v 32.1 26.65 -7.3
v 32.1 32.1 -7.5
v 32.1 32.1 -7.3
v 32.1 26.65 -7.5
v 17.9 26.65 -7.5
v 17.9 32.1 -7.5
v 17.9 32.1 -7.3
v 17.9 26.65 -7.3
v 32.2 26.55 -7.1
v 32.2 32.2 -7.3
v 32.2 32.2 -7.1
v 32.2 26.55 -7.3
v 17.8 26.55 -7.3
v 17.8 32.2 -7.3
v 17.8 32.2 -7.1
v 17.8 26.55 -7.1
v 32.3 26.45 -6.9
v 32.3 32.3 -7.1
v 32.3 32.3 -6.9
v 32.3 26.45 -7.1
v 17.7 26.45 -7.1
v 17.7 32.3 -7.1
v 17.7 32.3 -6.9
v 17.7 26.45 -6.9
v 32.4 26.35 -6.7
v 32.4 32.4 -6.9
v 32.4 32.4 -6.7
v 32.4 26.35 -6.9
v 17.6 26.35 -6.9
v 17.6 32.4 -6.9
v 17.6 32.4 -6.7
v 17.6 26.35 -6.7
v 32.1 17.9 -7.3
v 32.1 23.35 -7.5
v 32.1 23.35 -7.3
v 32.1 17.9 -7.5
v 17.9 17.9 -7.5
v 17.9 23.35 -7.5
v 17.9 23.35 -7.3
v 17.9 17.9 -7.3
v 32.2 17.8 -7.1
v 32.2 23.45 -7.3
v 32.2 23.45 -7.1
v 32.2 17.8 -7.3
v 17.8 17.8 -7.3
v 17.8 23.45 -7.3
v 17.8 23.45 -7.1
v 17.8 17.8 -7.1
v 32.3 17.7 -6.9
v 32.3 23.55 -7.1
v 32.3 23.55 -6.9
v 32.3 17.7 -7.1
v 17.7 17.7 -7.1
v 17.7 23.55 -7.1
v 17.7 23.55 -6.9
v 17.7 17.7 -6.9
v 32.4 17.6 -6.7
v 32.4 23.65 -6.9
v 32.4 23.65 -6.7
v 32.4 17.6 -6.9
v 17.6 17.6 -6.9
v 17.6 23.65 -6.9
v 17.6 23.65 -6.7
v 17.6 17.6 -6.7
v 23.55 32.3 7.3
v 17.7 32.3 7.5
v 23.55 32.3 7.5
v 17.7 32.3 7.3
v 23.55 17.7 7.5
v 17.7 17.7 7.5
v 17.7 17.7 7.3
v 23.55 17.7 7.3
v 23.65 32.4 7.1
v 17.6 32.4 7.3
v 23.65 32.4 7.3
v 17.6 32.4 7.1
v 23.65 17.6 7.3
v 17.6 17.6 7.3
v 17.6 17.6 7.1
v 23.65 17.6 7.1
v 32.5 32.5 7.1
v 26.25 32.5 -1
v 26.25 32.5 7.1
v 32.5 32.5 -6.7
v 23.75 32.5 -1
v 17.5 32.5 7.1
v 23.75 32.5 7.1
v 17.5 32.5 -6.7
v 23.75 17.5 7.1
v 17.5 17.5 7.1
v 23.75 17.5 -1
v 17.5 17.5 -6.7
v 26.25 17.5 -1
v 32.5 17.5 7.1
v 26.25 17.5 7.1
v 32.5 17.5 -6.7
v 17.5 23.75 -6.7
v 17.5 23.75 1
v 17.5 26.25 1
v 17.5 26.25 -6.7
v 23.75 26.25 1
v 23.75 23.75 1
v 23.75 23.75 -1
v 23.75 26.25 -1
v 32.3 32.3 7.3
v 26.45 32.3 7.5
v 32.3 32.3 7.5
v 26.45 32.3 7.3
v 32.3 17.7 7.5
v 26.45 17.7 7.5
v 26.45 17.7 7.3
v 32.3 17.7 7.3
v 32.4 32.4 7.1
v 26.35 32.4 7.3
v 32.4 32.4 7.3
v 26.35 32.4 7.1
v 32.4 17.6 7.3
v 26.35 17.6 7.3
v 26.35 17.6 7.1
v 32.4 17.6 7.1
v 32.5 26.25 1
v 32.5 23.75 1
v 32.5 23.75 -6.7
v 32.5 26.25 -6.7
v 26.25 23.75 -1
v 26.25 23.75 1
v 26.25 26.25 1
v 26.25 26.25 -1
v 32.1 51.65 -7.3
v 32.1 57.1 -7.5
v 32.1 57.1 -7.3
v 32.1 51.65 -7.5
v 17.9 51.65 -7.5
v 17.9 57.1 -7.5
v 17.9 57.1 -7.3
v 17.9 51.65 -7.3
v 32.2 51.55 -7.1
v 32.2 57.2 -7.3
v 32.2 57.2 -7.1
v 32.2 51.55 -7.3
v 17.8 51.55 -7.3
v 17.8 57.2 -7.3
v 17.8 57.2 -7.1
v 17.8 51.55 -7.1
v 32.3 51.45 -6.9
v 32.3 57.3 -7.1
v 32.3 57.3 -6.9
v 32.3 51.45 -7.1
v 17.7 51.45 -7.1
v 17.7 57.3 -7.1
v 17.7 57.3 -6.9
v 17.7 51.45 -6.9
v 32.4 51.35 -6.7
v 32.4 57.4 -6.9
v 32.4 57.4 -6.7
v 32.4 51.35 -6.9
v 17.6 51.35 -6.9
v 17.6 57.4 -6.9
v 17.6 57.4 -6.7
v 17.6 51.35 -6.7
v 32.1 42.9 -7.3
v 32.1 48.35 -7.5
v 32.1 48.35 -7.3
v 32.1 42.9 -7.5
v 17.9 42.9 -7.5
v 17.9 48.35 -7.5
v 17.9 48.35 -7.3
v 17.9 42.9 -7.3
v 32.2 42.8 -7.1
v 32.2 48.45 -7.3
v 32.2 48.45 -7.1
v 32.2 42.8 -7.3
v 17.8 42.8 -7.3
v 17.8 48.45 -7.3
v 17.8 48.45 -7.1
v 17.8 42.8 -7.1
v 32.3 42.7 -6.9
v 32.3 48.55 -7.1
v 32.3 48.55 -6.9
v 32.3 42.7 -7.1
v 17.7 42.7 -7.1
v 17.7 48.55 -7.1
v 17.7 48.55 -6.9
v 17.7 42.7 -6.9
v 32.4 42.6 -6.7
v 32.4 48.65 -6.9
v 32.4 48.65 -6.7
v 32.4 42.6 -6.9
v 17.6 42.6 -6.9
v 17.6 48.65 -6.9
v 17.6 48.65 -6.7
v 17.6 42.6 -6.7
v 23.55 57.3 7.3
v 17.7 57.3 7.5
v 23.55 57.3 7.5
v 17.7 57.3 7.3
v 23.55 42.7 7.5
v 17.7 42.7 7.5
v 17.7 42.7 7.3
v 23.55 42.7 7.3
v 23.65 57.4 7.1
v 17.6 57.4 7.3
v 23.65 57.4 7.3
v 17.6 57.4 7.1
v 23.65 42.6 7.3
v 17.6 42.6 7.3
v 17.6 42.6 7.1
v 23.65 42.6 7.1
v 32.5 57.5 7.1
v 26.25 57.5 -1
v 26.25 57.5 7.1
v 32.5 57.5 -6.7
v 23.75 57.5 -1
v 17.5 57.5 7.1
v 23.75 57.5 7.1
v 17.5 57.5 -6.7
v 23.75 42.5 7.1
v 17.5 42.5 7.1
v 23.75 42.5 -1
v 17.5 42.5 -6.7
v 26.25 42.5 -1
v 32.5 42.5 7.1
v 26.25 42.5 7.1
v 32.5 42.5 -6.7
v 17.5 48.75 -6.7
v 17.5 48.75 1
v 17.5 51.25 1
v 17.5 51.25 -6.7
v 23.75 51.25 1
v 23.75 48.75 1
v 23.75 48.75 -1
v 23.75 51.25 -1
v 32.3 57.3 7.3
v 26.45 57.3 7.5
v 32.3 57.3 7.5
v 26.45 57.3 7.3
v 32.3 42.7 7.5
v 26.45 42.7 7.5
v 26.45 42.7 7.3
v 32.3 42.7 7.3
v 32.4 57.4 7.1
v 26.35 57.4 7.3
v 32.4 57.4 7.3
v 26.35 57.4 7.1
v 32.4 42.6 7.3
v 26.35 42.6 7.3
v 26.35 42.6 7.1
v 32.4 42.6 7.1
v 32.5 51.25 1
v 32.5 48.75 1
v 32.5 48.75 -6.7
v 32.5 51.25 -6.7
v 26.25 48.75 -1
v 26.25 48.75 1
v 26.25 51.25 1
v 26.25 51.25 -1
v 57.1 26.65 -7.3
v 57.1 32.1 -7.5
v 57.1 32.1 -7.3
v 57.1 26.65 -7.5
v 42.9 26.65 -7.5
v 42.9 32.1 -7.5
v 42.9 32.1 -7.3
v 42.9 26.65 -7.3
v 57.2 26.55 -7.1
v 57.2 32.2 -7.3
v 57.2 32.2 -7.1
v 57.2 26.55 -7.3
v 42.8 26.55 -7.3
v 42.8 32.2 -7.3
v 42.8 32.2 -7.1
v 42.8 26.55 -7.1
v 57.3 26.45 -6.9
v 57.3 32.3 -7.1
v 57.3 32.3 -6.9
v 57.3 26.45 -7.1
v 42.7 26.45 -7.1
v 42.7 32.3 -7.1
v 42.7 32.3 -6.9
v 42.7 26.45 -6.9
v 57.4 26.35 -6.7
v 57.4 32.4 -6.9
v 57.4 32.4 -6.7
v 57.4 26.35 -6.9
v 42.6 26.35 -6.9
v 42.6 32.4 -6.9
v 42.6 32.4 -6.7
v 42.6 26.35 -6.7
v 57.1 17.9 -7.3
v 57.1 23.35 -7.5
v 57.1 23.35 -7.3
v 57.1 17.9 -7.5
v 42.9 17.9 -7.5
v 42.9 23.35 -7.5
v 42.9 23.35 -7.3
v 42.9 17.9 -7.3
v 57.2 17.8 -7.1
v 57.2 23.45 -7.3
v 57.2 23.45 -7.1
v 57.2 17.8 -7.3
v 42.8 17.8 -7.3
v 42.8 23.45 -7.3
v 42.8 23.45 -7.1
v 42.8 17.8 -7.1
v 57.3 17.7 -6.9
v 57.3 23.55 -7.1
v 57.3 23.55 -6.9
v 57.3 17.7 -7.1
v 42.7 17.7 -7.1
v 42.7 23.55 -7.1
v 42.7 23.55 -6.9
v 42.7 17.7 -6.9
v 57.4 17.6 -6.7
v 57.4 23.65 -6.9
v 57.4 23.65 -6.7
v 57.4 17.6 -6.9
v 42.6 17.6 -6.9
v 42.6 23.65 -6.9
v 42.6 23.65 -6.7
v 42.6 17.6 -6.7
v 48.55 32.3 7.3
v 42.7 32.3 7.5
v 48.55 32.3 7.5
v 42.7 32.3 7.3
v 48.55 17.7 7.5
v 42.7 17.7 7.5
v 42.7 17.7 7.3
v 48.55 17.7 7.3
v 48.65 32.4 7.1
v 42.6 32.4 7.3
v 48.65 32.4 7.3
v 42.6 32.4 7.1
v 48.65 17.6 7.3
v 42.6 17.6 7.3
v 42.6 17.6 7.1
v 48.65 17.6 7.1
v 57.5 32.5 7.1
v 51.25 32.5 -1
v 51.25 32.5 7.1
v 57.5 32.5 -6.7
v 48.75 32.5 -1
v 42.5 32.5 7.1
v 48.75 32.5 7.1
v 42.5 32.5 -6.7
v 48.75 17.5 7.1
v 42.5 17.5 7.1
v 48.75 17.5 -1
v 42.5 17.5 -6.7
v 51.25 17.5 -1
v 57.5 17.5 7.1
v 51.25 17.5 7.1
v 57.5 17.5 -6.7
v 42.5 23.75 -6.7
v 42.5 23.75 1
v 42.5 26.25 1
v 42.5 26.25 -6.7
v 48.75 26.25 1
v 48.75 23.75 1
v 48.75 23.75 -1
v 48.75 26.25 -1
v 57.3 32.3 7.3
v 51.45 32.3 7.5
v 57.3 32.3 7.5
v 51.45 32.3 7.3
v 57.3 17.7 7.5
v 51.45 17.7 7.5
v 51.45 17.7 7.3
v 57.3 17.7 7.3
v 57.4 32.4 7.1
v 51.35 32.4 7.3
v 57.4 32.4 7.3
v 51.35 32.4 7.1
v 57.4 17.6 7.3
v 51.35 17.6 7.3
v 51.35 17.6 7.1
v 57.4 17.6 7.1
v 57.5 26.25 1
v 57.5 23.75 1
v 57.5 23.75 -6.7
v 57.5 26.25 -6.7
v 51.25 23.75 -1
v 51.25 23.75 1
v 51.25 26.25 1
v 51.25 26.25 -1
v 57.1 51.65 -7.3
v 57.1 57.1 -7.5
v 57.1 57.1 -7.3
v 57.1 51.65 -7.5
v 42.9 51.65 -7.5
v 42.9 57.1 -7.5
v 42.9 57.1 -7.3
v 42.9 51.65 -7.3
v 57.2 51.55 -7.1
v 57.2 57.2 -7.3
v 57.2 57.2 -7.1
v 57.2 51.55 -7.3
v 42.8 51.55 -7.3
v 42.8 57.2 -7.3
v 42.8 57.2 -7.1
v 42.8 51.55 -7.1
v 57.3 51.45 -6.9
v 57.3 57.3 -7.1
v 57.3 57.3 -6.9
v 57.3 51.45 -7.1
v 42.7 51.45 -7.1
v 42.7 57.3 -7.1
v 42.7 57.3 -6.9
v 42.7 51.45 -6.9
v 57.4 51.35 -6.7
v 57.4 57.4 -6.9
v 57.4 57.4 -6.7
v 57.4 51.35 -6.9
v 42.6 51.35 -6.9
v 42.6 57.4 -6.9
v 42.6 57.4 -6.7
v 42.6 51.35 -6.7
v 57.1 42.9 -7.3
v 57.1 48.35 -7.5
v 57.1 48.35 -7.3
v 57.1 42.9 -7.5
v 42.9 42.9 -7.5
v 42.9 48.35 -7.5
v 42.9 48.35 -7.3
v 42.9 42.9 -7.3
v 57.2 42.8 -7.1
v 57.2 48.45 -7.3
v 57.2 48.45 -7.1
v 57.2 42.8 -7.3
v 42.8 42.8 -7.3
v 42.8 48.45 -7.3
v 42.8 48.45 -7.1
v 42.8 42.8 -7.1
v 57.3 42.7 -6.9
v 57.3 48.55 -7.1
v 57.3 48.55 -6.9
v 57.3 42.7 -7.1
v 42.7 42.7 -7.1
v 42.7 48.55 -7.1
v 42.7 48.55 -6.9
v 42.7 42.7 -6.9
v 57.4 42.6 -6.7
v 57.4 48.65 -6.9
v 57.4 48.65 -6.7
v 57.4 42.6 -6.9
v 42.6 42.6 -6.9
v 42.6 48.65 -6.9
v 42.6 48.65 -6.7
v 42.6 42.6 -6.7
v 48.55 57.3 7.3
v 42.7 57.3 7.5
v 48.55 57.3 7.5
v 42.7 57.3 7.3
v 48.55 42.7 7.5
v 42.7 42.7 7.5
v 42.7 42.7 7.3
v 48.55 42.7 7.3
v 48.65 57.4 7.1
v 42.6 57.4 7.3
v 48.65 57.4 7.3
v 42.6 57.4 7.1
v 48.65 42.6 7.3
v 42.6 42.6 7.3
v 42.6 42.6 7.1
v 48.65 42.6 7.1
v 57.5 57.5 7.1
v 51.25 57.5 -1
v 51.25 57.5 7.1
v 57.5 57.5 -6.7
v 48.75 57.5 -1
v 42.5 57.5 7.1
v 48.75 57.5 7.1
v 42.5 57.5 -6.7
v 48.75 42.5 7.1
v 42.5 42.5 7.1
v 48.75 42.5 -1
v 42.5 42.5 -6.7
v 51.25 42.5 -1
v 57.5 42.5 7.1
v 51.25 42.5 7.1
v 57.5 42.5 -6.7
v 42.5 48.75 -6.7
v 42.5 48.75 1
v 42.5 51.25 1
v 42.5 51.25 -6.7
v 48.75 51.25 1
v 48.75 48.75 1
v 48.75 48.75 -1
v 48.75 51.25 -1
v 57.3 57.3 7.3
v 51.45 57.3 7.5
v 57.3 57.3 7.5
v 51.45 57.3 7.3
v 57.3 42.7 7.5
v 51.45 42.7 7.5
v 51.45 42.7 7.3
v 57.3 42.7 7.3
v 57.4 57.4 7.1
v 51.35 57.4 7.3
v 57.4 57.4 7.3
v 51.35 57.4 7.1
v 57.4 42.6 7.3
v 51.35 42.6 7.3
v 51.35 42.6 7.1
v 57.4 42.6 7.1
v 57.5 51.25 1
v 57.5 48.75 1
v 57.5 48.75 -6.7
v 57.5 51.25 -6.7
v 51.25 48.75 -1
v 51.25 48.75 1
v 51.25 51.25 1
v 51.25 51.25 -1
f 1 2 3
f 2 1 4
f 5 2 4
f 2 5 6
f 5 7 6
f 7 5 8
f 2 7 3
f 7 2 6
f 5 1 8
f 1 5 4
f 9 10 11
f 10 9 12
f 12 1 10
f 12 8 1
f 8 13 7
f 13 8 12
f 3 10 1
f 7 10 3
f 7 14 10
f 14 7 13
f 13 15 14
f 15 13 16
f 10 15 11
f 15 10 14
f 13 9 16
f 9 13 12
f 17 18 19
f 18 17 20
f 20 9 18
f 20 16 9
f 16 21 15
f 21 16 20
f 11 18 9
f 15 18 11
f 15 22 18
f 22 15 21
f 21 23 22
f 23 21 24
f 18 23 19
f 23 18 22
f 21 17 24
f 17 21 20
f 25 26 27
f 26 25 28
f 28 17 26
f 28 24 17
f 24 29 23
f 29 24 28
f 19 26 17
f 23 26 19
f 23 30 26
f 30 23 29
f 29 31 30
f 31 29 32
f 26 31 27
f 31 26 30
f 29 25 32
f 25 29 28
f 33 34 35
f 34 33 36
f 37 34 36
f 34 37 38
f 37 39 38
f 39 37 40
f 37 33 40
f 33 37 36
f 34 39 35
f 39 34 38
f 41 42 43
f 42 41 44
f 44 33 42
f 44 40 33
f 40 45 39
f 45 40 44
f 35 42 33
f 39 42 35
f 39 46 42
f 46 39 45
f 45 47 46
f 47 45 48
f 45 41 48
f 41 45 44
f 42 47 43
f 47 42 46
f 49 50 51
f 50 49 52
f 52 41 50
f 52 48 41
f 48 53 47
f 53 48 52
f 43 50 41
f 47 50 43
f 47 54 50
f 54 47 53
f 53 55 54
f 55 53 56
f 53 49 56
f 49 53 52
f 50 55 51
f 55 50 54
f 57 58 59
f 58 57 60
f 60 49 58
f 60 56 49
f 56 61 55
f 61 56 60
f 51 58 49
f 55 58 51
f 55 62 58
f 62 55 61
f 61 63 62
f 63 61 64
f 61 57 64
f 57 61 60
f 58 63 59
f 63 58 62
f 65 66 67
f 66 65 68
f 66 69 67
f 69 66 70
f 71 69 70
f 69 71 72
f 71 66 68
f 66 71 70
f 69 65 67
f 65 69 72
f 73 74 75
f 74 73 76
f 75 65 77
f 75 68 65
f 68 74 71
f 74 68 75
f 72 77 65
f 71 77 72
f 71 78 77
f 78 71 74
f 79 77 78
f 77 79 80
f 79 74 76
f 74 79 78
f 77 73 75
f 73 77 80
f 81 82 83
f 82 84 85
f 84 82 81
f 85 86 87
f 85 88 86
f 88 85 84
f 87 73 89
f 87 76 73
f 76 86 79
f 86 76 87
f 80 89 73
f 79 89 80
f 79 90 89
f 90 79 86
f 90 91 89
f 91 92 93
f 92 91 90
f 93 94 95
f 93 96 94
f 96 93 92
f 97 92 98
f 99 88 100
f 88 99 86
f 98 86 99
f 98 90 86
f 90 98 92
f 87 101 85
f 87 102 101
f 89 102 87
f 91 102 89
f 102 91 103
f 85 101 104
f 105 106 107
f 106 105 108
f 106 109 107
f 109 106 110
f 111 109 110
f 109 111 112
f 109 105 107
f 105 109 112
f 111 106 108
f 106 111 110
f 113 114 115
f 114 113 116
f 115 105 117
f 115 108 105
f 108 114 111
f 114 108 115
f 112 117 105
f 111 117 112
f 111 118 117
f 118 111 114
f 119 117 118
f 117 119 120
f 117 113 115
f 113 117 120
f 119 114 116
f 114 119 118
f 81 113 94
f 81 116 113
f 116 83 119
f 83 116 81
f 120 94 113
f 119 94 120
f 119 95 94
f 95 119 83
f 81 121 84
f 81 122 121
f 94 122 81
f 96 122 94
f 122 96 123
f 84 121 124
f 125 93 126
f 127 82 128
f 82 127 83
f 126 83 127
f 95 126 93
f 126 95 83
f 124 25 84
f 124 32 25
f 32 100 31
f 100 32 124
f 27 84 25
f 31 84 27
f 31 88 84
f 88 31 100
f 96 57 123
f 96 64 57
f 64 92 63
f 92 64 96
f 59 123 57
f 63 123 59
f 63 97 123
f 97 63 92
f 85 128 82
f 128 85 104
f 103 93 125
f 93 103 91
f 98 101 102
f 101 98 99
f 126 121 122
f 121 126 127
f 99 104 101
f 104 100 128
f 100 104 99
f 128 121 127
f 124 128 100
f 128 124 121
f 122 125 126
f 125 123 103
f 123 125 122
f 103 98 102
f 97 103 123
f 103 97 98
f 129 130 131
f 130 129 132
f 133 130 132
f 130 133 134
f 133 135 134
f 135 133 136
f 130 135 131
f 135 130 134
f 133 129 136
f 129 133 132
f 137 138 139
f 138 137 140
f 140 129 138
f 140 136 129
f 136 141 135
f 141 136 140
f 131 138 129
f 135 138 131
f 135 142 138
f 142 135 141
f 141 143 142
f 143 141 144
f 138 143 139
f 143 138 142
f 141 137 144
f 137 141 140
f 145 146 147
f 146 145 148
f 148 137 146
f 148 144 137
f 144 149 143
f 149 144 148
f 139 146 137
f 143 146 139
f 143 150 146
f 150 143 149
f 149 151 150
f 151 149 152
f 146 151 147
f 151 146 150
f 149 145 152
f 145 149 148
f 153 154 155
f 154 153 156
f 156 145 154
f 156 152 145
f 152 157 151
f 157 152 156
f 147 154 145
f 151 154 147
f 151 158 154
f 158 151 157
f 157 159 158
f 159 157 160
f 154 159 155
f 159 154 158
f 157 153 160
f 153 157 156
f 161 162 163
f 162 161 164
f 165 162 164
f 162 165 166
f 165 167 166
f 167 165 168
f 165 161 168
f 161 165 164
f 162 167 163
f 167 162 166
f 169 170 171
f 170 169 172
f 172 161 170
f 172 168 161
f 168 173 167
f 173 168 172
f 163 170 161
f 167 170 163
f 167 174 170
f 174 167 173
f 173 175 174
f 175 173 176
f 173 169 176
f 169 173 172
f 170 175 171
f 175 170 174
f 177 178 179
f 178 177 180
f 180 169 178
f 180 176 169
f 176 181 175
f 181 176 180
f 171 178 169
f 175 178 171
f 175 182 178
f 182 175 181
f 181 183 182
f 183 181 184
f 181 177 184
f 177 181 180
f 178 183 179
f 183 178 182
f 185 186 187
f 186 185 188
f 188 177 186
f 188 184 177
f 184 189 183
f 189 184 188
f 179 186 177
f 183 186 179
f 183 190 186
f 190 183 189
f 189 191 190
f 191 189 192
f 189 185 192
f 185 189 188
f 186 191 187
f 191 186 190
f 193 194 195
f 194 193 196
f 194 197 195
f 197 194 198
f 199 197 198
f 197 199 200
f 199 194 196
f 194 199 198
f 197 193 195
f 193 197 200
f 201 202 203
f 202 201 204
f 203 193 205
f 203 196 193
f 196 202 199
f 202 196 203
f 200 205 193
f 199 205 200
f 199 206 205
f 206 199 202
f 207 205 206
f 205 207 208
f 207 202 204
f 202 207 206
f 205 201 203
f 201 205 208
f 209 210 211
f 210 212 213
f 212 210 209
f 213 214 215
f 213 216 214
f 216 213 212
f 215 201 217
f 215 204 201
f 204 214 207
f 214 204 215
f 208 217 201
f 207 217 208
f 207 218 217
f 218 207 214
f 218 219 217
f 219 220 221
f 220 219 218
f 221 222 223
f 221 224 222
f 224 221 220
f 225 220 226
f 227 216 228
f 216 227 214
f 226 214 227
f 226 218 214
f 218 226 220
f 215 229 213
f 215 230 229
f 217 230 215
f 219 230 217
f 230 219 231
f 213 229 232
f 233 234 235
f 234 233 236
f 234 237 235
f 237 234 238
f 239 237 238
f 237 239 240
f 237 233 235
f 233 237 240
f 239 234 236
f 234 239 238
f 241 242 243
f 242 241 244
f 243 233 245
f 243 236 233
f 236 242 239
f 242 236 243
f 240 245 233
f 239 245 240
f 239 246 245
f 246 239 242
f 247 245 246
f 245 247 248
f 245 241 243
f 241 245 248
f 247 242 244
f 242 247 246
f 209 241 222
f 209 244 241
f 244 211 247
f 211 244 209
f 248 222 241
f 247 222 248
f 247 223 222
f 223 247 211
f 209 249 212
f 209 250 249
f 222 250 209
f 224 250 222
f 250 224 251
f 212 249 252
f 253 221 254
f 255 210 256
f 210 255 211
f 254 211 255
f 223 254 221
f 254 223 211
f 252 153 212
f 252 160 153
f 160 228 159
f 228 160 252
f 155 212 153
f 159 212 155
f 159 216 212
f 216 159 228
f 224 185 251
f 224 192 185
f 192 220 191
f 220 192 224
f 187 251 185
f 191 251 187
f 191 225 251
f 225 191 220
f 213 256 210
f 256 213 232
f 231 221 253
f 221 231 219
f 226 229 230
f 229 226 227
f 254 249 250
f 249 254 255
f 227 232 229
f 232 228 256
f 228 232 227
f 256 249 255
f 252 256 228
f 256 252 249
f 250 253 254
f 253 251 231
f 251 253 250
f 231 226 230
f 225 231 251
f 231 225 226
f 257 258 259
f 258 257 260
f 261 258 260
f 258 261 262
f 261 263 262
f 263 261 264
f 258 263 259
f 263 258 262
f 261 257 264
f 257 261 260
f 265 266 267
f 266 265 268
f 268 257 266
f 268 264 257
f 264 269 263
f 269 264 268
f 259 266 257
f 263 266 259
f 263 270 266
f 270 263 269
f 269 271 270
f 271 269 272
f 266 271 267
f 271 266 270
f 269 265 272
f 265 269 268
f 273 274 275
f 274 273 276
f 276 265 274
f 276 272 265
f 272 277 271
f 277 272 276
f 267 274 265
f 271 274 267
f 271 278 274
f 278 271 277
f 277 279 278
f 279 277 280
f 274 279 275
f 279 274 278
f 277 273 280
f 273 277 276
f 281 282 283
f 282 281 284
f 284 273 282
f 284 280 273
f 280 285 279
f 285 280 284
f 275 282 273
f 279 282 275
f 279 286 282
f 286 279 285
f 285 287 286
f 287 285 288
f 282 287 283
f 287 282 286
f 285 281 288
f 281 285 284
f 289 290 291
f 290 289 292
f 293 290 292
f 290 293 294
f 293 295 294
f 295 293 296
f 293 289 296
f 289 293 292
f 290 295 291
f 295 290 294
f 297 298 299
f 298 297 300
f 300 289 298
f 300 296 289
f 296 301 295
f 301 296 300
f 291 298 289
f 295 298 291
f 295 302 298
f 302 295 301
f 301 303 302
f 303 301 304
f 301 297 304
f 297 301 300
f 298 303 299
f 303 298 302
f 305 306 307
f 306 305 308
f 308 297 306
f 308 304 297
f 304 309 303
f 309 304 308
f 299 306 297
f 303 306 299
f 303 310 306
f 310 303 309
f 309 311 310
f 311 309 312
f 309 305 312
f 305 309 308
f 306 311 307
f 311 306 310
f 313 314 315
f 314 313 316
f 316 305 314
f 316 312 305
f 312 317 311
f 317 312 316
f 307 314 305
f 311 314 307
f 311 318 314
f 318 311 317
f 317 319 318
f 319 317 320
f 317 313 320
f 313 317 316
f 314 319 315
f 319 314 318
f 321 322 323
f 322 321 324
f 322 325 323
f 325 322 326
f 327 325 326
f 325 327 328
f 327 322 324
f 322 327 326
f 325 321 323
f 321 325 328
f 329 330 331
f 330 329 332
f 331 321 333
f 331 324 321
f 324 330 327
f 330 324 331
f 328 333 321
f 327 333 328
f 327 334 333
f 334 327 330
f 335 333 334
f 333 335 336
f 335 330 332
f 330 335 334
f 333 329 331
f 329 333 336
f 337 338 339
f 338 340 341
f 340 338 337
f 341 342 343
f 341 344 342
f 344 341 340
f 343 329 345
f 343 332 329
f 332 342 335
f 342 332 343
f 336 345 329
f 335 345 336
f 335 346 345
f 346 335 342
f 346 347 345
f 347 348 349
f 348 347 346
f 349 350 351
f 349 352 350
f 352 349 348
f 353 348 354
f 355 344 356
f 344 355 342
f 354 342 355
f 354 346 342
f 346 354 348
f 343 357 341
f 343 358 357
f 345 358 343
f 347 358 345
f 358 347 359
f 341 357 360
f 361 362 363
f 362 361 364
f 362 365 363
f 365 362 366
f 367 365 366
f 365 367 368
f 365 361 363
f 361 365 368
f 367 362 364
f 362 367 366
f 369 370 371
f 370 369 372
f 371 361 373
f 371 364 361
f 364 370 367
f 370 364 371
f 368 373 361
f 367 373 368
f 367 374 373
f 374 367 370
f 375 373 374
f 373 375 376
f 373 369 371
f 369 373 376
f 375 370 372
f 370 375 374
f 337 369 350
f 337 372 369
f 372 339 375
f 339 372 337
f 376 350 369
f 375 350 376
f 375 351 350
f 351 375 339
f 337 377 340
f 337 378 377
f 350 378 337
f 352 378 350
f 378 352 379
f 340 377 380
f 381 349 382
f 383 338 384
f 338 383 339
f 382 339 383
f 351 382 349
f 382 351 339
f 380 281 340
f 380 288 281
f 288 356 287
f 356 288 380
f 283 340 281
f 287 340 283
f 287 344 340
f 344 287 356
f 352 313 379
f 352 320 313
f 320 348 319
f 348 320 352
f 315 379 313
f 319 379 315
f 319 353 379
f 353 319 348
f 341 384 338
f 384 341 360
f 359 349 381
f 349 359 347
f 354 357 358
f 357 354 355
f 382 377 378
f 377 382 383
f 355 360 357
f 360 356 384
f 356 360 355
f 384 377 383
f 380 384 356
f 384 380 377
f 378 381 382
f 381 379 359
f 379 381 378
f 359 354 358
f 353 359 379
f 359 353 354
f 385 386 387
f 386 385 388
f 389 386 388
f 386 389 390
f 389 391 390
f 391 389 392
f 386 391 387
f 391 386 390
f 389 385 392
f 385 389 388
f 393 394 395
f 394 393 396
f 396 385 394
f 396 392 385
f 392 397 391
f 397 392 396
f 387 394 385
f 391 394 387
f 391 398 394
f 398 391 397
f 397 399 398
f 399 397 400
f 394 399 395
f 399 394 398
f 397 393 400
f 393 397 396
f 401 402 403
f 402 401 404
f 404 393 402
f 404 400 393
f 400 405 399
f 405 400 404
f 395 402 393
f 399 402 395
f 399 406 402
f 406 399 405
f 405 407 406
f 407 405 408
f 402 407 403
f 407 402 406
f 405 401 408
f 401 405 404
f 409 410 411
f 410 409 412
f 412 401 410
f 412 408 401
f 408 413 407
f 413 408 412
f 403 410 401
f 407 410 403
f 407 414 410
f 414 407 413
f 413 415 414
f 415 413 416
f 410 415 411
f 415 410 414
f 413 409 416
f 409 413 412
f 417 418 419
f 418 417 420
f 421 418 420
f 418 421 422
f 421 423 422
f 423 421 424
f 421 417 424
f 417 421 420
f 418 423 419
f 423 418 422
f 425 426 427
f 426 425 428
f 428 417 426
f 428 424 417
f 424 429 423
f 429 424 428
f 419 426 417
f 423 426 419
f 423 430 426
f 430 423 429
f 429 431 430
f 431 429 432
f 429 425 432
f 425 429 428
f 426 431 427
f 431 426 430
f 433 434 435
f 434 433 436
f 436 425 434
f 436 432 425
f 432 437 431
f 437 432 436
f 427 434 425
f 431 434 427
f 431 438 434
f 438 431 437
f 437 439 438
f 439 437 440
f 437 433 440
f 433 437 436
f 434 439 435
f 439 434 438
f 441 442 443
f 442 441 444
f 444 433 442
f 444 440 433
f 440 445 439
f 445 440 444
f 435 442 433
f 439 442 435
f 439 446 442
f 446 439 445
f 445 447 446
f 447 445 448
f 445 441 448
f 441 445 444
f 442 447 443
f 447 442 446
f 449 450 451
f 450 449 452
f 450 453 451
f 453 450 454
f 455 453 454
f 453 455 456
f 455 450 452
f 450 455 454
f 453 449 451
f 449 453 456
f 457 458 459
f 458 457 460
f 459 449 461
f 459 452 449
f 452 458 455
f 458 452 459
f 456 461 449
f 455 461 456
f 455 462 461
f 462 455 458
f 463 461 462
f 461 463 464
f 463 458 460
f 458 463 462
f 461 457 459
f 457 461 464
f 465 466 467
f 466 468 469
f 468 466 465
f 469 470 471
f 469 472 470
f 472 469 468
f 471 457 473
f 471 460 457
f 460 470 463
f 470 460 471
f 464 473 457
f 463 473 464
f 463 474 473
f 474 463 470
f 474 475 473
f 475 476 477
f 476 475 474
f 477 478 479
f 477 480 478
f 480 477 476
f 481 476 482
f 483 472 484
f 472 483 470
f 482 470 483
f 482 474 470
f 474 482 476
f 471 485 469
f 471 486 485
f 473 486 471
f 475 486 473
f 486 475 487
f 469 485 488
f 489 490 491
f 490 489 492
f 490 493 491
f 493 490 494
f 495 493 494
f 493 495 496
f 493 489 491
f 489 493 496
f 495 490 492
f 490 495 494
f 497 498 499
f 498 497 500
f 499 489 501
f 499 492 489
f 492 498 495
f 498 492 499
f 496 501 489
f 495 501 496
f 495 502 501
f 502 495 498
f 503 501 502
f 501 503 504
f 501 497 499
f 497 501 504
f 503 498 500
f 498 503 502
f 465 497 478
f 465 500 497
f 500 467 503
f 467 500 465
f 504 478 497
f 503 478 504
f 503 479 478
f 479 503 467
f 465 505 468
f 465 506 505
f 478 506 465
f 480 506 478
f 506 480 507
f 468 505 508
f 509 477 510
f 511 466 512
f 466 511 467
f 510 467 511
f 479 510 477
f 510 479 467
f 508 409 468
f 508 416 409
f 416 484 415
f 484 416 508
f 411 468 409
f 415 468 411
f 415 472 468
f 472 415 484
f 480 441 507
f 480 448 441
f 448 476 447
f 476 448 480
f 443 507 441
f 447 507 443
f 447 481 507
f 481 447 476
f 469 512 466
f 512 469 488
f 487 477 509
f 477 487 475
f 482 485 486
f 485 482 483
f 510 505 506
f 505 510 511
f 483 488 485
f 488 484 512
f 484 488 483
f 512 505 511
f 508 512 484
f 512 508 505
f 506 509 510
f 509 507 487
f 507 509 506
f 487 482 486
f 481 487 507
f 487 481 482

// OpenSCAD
// A 3D Toy

eps1 = 0.01;
eps2 = 2*eps1;

// Cube size.
cube_size = 15;

// Match this to elastic string's diameter.
slot_width = 2.5;

// Roughly the string diameter when streched.
slot_overlap =2;

// Number of cube rows to print.
rows = 2;

// Number of cube columns to print
columns = 2;

// Space between cubes in the matrix. 
printing_space = 10;

pitch = cube_size + printing_space;

slot_depth = (cube_size + slot_overlap) / 2;

layer_height = 0.2;

// Inset levels per layer. Bottom layer first.
bottom_insets = [0.4, 0.3, 0.2, 0.1];

top_insets = [0.2, 0.1, 0.0, 0.0];

insets_height = len(bottom_insets) * layer_height;

// At height insets_height + eps1. 
module inset_base(layer_insets) {
  dx = cube_size;
  dy = (cube_size - slot_width)/2;
  for (i = [0 : len(layer_insets) - 1]) { 
    inset = layer_insets[i];
    dx_inset = dx - 2*inset;
    dy_inset = dy - 2*inset;
    translate([0, (cube_size + slot_width)/4, -cube_size/2]) 
    translate([-dx_inset/2, -dy_inset/2, i*layer_height]) 
        #cube([dx_inset, dy_inset, layer_height+eps1]);
  }
}

module inset_bases() {
  inset_base(bottom_insets);
  mirror([0, 1, 0]) inset_base(bottom_insets);
  rotate([0, 0, 90]) {
    union() {
      mirror([0, 0, 1]) inset_base(top_insets);
      mirror([0, 0, 1]) mirror([0, 1, 0]) inset_base(top_insets);
    }
  }
}

module cube_body() {
  cube([cube_size, cube_size, cube_size-2*insets_height], center=true);
}

module sloted_cube() {
  difference() {
    union() {
      cube_body();   
      inset_bases();
    }

    translate([-slot_width/2, -cube_size/2 - eps1, -slot_overlap/2]) 
        cube([slot_width, cube_size+eps2, slot_depth+eps1]);

    translate([-cube_size/2 - eps1, -slot_width/2,  - cube_size/2-eps1]) 
        cube([cube_size+eps2, slot_width, slot_depth+eps1]);
  }
}

module main() {
  for (i = [1:columns]) {
    for (j = [1:rows]) {
      translate([i*pitch, j*pitch, 0]) sloted_cube();
    }
  }
}

//sloted_cube();
//
//
//inset_bases();

main();

//cube([15, 15, 10]);
//cube_body();
